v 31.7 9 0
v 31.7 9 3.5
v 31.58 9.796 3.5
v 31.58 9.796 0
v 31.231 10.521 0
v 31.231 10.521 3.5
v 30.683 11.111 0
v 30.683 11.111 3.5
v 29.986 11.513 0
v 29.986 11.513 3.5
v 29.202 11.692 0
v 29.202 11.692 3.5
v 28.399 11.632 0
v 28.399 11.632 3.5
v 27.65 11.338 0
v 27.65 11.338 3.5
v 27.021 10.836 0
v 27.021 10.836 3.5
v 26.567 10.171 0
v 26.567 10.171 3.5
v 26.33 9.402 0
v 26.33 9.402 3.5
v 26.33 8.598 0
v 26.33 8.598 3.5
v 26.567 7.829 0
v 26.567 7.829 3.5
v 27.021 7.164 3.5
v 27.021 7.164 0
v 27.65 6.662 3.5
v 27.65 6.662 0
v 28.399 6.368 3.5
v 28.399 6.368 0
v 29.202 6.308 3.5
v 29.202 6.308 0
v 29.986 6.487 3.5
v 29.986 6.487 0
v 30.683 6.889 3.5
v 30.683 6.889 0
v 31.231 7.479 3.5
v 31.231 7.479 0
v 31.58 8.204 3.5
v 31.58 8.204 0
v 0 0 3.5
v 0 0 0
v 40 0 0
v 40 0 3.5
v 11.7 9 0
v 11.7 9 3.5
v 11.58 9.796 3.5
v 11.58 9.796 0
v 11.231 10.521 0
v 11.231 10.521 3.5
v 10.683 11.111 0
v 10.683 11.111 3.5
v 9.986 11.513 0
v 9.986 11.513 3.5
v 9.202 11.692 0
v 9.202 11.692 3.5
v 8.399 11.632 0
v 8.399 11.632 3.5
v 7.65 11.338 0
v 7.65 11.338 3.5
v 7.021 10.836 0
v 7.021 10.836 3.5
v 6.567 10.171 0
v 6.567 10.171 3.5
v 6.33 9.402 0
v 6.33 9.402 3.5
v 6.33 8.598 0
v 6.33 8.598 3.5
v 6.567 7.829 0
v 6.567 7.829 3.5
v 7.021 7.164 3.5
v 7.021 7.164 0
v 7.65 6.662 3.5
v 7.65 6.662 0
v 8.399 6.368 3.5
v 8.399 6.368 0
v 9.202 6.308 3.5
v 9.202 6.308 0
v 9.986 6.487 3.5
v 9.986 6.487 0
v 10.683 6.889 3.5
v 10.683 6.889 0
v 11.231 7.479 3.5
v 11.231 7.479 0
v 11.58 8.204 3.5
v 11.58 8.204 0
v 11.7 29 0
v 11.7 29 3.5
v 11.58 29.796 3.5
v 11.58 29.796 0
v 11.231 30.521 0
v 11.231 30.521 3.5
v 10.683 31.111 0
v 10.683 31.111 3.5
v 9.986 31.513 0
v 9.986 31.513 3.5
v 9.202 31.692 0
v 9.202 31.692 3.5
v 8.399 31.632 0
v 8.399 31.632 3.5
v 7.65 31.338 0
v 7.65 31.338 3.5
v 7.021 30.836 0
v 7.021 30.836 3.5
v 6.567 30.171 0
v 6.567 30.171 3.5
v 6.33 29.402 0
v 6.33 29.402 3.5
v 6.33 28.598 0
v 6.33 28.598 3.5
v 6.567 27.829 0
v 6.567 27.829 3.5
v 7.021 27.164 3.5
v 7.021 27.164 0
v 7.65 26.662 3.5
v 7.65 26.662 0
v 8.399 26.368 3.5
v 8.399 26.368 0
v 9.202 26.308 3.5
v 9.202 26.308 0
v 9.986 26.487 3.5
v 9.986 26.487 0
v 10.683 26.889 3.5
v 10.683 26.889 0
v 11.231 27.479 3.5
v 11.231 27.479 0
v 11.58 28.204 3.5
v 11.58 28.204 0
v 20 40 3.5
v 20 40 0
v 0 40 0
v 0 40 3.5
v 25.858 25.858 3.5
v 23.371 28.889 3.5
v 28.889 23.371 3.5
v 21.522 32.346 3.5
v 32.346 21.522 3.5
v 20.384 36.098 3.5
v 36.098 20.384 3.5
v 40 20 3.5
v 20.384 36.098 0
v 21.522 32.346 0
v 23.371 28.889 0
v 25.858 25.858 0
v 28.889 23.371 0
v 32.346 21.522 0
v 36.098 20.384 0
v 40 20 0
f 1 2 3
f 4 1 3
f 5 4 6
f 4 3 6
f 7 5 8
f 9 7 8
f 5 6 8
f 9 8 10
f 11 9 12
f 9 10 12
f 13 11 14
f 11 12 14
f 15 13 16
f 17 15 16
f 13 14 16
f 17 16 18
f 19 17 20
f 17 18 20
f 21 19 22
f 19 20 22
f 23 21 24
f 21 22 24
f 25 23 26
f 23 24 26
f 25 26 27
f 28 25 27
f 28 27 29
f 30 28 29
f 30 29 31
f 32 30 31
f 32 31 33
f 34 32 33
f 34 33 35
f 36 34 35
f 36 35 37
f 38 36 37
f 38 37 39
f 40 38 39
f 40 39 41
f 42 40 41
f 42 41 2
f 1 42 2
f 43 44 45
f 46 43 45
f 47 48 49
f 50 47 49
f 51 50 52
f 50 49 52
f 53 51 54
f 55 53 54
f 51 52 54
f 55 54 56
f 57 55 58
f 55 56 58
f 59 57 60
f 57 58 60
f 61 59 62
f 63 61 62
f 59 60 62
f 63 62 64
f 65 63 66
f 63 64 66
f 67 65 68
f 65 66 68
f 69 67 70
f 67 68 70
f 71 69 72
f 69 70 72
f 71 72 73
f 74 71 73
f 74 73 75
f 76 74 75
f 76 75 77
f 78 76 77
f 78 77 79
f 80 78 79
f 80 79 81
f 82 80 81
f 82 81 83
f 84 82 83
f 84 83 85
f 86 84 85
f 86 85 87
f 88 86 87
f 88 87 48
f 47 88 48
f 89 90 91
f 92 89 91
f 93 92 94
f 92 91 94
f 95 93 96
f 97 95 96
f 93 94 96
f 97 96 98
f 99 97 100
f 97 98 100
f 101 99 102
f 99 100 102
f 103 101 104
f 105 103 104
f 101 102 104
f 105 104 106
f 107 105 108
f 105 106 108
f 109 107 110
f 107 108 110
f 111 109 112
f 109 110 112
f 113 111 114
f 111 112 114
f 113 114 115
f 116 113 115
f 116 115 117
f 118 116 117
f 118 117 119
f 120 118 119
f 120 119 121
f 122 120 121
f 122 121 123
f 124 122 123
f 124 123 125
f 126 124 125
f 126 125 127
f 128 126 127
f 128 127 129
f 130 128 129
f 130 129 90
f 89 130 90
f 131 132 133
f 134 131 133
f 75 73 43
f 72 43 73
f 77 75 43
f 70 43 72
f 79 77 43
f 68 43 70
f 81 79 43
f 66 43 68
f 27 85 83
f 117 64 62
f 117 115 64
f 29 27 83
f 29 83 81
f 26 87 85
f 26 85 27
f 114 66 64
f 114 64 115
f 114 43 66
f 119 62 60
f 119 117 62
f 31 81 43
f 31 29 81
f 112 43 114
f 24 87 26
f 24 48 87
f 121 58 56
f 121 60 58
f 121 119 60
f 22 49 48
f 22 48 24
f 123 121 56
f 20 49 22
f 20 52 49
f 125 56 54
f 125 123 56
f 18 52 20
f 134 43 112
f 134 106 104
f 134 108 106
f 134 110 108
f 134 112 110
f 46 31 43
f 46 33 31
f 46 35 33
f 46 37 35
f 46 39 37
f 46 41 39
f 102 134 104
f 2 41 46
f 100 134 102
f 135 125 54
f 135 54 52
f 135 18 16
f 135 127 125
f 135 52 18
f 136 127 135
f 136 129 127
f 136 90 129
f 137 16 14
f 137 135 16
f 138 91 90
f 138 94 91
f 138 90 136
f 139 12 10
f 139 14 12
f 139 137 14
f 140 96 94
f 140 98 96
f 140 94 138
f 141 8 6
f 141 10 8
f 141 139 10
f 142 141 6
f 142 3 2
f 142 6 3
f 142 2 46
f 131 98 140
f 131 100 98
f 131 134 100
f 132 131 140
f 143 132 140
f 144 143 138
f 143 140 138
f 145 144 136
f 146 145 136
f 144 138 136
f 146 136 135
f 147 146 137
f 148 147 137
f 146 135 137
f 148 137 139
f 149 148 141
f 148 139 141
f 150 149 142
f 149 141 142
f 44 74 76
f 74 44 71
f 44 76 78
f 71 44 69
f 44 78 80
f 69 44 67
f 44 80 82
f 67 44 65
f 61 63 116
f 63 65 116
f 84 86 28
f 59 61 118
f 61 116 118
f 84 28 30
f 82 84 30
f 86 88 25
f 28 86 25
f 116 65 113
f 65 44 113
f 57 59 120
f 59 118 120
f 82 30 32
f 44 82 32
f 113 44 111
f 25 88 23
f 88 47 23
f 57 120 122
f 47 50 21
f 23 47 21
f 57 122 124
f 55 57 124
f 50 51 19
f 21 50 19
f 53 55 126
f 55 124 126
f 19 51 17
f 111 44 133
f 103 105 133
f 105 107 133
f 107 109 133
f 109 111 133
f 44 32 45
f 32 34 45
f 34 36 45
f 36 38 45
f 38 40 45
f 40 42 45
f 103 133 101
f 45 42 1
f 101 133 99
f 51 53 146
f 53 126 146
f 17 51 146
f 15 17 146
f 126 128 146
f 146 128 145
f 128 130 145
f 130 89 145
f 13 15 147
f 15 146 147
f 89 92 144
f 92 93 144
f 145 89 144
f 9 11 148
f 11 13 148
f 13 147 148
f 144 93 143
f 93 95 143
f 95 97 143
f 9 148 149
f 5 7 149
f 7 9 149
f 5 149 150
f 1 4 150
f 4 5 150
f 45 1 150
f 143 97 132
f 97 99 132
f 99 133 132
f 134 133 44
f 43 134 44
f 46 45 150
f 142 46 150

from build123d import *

# Parameters (mm, degrees)
PAD_DEPTH       = 3.5
SKETCH001_R     = 2.7
POCKET_DEPTH    = 5
SKETCH002_R     = 20
POCKET001_DEPTH = 5


with BuildPart() as part:
    # Sketch → Pad (new body)
    with BuildSketch(Plane.XY):
        Polygon((0, 0), (40, 0), (40, 20), (20, 40), (0, 40), align=None)
    extrude(amount=PAD_DEPTH)

    # Sketch001 → Pocket (cut)
    with BuildSketch(Plane.XY.offset(3.5)):
        with Locations((9, 29)):
            Circle(SKETCH001_R)
        with Locations((29, 9)):
            Circle(SKETCH001_R)
        with Locations((9, 9)):
            Circle(SKETCH001_R)
    extrude(amount=-POCKET_DEPTH, mode=Mode.SUBTRACT)

    # Sketch002 → Pocket001 (cut)
    with BuildSketch(Plane.XY.offset(3.5)):
        with Locations((40, 40)):
            Circle(SKETCH002_R)
    extrude(amount=-POCKET001_DEPTH, mode=Mode.SUBTRACT)


solid = part.part
